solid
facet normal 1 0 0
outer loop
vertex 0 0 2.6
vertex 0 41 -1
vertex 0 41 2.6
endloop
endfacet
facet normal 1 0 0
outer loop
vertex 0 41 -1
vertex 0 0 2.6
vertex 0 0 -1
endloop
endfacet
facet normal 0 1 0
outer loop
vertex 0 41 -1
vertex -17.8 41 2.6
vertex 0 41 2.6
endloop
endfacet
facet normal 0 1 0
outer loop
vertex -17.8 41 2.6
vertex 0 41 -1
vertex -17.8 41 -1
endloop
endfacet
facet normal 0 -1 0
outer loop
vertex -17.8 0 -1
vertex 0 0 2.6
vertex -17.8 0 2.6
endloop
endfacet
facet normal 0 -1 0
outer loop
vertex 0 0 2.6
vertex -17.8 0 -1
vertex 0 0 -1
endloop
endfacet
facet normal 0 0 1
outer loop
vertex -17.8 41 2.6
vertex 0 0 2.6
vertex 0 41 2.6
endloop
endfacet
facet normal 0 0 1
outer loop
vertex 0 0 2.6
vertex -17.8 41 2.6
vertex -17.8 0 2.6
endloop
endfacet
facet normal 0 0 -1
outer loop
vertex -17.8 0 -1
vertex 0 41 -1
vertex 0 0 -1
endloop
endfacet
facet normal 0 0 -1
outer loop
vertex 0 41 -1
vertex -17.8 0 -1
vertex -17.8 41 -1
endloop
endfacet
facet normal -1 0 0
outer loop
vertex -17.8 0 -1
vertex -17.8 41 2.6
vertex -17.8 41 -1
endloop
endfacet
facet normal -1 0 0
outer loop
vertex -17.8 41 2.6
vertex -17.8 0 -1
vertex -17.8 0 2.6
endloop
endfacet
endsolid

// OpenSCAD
/**
 * Maritn Egli
 *2028-03-28
 */

module g431b_esc1_pcb_model() {
    // attention this is mirrored, x pos was to the right, y pos to the top
    th = 1.6;
    mirror([1, 0, 0])
    difference() {
        union() {
            // PCB
            color("DarkBlue")
            translate([0, 0, 0])
            cube([17.75, 41, th]);
            
            // top side GTO
            // gold motor contacts
            color("Gold")
            translate([0.55, 0.1, -0.01])
            cube([4.5, 2.5, th+0.02]);
            color("Gold")
            translate([6.75, 0.1, -0.01])
            cube([4.5, 2.5, th+0.02]);
            color("Gold")
            translate([13.0, 0.1, -0.01])
            cube([4.5, 2.5, th+0.02]);
            // mosfets
            color("DarkGray")
            translate([0.7, 2.9, th])
            cube([5.2, 7.2, 1]);
            color("DarkGray")
            translate([6.35, 2.9, th])
            cube([5.2, 7.2, 1]);
            color("DarkGray")
            translate([12, 2.9, th])
            cube([5.2, 7.2, 1]);
            color("DarkGray")
            translate([0.7, 11.3, th])
            cube([5.2, 7.2, 1]);
            color("DarkGray")
            translate([6.35, 11.3, th])
            cube([5.2, 7.2, 1]);
            color("DarkGray")
            translate([12, 11.3, th])
            cube([5.2, 7.2, 1]);
            // mosfet drivers
            color("DarkGray")
            translate([0.7, 22.3, th])
            cube([5.0, 4.8, 1]);
            color("DarkGray")
            translate([6.35, 22.3, th])
            cube([5.0, 4.8, 1]);
            color("DarkGray")
            translate([12, 22.3, th])
            cube([5.0, 4.8, 1]);
            
            // gold contacts battery
            color("Gold")
            translate([0.15, 36.9, -0.01])
            cube([3.1, 4.0, th+0.02]);
            color("Gold")
            translate([14.6, 36.9, th])
            cube([3.1, 4.1, 0.01]);
            // SWD J4
            color("White")
            translate([0.2, 31.25, th])
            cube([2.3, 5.4, 1]);
            // UART J?
            color("White")
            translate([3.55, 39.25, th])
            cube([9.7, 1.6, 1]);
            
            // bottom side GBO
            // CAN J1
            color("White")
            translate([15.75, 25.6, -1])
            cube([1.85, 7.7, 1]);
            
            // HAL J8
            color("White")
            translate([3.4, 32.3, -1])
            cube([9.5, 1.85, 1]);
            
            // MCU
            color("DarkGray")
            translate([5.25, 18.95, -1])
            cube([7.1, 7.1, 1]);
            
            // current shunts
            color("LightGray")
            translate([1.65, 8.2, -0.5])
            cube([3.3, 5.0, 0.5]);
            color("LightGray")
            translate([7.3, 8.2, -0.5])
            cube([3.3, 5.0, 0.5]);
            color("LightGray")
            translate([12.95, 8.2, -0.5])
            cube([3.3, 5.0, 0.5]);
            
            // input cap bank
            color("Orange")
            for(n = [0:1:6]) {
                translate([3.3+n*1.65, 35.7, -0.8])
                cube([1.5, 1.9, 0.8]);
                translate([3.3+n*1.65, 38.6, -0.8])
                cube([1.5, 1.9, 0.8]);
            }
        }
        // cut near motor contacts
        translate([5.2, -0.2, -1])
        cube([1.5, 2.7, th+2]);
        translate([11.4, -0.2, -1])
        cube([1.5, 2.7, th+2]);
    }
}
g431b_esc1_pcb_model();

module g431b_esc1_simple_model() {
    th = 1.6;
    color("LightBlue")
    translate([-17.8, 0, -1])
    cube([17.8, 41, th+2]);
}
g431b_esc1_simple_model();
